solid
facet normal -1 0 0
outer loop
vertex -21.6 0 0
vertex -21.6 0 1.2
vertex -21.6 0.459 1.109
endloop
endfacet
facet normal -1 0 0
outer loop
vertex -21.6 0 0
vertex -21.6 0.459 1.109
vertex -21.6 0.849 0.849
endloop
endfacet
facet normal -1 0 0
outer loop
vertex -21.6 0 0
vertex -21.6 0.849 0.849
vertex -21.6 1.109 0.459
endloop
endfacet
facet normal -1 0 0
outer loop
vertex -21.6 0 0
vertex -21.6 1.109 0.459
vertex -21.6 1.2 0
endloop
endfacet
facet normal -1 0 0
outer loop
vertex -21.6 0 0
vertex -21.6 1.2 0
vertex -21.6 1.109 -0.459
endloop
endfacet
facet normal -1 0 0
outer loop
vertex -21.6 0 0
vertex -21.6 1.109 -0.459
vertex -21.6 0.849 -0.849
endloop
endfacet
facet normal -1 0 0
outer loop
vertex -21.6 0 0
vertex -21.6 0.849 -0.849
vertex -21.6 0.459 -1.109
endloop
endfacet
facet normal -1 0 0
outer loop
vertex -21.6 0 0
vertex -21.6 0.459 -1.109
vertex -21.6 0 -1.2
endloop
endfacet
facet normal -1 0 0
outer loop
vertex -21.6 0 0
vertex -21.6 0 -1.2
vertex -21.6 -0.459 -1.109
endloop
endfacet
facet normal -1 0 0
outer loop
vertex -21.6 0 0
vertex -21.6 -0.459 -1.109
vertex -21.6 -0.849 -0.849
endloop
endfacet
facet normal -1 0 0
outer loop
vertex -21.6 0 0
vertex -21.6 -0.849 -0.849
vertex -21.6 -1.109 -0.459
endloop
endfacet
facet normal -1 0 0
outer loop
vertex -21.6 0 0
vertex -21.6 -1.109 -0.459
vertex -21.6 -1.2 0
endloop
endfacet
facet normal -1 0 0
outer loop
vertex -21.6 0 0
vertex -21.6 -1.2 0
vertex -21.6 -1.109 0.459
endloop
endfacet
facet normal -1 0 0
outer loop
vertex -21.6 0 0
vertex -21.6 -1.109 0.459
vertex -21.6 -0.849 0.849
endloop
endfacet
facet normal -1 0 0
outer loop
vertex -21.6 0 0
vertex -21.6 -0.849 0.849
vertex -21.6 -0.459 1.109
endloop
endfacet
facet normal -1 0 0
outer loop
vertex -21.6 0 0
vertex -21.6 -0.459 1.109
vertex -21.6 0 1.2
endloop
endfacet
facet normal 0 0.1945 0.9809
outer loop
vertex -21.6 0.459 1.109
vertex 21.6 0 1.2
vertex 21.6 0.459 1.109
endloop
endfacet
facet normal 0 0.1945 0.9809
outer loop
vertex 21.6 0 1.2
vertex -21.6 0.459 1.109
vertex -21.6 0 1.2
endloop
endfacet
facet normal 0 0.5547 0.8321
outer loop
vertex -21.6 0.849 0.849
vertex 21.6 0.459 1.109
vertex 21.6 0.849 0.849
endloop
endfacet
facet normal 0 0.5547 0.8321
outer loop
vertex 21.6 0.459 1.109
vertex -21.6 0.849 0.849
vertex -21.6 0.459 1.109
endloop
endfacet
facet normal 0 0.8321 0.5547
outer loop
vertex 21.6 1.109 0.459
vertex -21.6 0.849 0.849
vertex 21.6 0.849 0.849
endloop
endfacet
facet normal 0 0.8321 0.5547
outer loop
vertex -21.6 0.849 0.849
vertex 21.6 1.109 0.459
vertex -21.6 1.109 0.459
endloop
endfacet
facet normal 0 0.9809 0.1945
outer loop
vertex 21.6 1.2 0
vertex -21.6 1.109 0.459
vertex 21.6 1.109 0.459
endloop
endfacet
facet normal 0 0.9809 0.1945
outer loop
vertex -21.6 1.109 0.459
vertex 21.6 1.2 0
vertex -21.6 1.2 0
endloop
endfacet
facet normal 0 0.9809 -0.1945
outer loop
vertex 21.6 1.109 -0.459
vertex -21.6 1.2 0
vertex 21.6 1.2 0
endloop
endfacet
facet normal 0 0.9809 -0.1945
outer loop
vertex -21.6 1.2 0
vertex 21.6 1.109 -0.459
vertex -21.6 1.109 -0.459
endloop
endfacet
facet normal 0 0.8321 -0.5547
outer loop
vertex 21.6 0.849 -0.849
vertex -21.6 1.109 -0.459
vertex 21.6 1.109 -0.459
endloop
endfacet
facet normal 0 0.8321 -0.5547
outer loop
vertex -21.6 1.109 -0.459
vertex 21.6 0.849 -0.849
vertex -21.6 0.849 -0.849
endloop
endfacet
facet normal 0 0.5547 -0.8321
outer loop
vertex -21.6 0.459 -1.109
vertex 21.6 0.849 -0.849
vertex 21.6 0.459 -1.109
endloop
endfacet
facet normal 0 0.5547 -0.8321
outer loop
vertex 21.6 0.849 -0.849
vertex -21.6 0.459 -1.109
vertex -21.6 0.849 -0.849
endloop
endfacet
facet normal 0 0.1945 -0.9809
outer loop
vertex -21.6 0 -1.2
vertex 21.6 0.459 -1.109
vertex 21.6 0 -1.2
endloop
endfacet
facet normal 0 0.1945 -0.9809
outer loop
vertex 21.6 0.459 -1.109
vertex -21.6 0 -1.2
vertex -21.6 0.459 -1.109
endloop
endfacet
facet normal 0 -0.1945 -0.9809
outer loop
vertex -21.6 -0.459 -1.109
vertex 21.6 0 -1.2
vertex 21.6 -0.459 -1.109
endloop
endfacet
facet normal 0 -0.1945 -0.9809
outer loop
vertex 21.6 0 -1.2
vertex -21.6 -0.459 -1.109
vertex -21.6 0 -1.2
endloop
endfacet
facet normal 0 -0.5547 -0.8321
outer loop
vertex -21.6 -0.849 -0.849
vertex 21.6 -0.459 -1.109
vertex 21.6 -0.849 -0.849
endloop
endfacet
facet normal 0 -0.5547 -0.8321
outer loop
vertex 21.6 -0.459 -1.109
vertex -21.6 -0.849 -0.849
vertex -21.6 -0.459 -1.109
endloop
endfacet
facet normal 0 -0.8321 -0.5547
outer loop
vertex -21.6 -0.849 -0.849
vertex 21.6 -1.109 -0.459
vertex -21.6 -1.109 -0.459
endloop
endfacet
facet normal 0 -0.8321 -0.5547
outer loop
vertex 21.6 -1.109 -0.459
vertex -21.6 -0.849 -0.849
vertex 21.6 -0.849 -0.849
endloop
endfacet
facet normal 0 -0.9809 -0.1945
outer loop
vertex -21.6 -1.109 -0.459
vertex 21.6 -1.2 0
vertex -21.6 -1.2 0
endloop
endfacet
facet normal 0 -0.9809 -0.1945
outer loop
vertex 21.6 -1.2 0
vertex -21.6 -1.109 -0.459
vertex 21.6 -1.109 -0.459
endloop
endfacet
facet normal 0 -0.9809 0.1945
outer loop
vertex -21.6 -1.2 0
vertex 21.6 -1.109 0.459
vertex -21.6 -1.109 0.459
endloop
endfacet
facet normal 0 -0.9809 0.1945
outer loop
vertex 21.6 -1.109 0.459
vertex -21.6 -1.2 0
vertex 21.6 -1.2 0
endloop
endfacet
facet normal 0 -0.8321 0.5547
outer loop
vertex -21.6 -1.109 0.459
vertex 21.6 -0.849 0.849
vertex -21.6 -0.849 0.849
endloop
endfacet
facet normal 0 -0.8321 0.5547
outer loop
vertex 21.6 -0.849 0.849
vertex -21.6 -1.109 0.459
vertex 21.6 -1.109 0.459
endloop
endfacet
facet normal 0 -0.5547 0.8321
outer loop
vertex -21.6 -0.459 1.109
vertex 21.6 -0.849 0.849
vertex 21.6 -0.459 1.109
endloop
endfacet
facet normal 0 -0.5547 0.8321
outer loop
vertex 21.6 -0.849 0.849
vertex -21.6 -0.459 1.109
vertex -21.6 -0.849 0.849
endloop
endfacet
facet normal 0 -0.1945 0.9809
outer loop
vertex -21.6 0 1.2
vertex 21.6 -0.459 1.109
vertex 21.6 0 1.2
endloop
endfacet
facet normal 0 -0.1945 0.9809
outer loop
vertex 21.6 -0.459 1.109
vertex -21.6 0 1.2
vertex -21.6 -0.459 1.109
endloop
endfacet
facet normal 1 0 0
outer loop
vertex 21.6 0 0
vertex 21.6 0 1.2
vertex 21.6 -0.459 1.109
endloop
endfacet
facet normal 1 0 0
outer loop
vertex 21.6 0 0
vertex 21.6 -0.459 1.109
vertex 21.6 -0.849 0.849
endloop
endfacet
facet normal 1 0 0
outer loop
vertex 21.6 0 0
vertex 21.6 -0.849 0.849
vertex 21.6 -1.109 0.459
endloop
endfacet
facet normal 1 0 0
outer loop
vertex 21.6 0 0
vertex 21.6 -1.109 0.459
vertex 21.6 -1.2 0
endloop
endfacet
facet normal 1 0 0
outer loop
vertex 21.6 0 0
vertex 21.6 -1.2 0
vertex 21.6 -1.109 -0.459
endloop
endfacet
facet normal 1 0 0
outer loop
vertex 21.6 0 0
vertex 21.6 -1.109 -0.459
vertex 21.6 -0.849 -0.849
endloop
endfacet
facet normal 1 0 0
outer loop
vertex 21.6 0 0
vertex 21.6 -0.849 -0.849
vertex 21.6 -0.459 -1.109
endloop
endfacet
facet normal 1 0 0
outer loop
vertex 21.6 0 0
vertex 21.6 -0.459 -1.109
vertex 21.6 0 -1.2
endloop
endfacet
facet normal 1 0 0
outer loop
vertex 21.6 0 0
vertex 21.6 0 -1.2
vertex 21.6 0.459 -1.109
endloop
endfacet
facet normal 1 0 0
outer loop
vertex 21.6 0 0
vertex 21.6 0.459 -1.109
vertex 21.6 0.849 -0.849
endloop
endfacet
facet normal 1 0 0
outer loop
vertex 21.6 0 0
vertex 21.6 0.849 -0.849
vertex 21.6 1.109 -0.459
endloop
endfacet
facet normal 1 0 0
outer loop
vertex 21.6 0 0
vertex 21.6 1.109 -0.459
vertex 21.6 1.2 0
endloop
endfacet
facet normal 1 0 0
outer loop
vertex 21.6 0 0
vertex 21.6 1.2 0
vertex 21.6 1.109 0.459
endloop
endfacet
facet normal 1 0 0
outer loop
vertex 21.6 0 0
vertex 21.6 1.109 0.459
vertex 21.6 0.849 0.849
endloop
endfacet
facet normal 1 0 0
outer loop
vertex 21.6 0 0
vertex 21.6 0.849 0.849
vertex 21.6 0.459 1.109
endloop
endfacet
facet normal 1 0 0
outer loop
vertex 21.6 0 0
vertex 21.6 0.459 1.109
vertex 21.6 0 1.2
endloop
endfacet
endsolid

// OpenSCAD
// file: ../p/4-4edge.scad
use <../lib.scad>
function ldraw_lib__4_4edge() = [
// 0 Circle 1.0
// 0 Name: 4-4edge.dat
// 0 Author: James Jessiman
// 0 !LDRAW_ORG Primitive UPDATE 2017-01
// 0 !LICENSE Licensed under CC BY 4.0 : see CAreadme.txt
// 
// 0 BFC CERTIFY CCW
  [0,"BFC","CERTIFY"],
  [0,"BFC","CCW"],
// 
// 0 !HISTORY 1998-12-15 [PTadmin] Official Update 1998-10
// 0 !HISTORY 2005-12-28 [PTadmin] Official Update 2005-01
// 0 !HISTORY 2007-06-24 [PTadmin] Header formatted for Contributor Agreement
// 0 !HISTORY 2008-07-01 [PTadmin] Official Update 2008-01
// 0 !HISTORY 2017-01-15 [Steffen] BFCed
// 0 !HISTORY 2017-12-30 [PTadmin] Official Update 2017-01
// 
// 
// 2 24 1 0 0 0.9239 0 0.3827
  [2,24,1,0,0,0.9239,0,0.3827],
// 2 24 0.9239 0 0.3827 0.7071 0 0.7071
  [2,24,0.9239,0,0.3827,0.7071,0,0.7071],
// 2 24 0.7071 0 0.7071 0.3827 0 0.9239
  [2,24,0.7071,0,0.7071,0.3827,0,0.9239],
// 2 24 0.3827 0 0.9239 0 0 1
  [2,24,0.3827,0,0.9239,0,0,1],
// 2 24 0 0 1 -0.3827 0 0.9239
  [2,24,0,0,1,-0.3827,0,0.9239],
// 2 24 -0.3827 0 0.9239 -0.7071 0 0.7071
  [2,24,-0.3827,0,0.9239,-0.7071,0,0.7071],
// 2 24 -0.7071 0 0.7071 -0.9239 0 0.3827
  [2,24,-0.7071,0,0.7071,-0.9239,0,0.3827],
// 2 24 -0.9239 0 0.3827 -1 0 -0
  [2,24,-0.9239,0,0.3827,-1,0,-0],
// 2 24 -1 0 -0 -0.9239 0 -0.3827
  [2,24,-1,0,-0,-0.9239,0,-0.3827],
// 2 24 -0.9239 0 -0.3827 -0.7071 0 -0.7071
  [2,24,-0.9239,0,-0.3827,-0.7071,0,-0.7071],
// 2 24 -0.7071 0 -0.7071 -0.3827 0 -0.9239
  [2,24,-0.7071,0,-0.7071,-0.3827,0,-0.9239],
// 2 24 -0.3827 0 -0.9239 0 0 -1
  [2,24,-0.3827,0,-0.9239,0,0,-1],
// 2 24 0 0 -1 0.3827 0 -0.9239
  [2,24,0,0,-1,0.3827,0,-0.9239],
// 2 24 0.3827 0 -0.9239 0.7071 0 -0.7071
  [2,24,0.3827,0,-0.9239,0.7071,0,-0.7071],
// 2 24 0.7071 0 -0.7071 0.9239 0 -0.3827
  [2,24,0.7071,0,-0.7071,0.9239,0,-0.3827],
// 2 24 0.9239 0 -0.3827 1 0 0
  [2,24,0.9239,0,-0.3827,1,0,0],
];
module ldraw_lib__4_4edge(step=0, col=false, unit=2/5, alt=false, line=0.2, solid=!$preview)
    makepoly(ldraw_lib__4_4edge(), step=step, col=col, unit=unit, alt=alt, line=line, solid=solid);
ldraw_lib__4_4edge(line=0.2);
// file: ../p/4-4cyli.scad
use <../lib.scad>
function ldraw_lib__4_4cyli() = [
// 0 Cylinder 1.0
// 0 Name: 4-4cyli.dat
// 0 Author: James Jessiman
// 0 !LDRAW_ORG Primitive UPDATE 2005-01
// 0 !LICENSE Licensed under CC BY 4.0 : see CAreadme.txt
// 
// 0 BFC CERTIFY CCW
  [0,"BFC","CERTIFY"],
  [0,"BFC","CCW"],
// 
// 0 !HISTORY 1998-12-15 [PTadmin] Official Update 1998-10
// 0 !HISTORY 2002-03-23 [sbliss] Added BFC statement; merged headers from files in distributions LDraw 0.27 and Complete.
// 0 !HISTORY 2002-04-25 [PTadmin] Official Update 2002-02
// 0 !HISTORY 2004-12-14 [guyvivan] BFC CCW
// 0 !HISTORY 2005-12-28 [PTadmin] Official Update 2005-01
// 0 !HISTORY 2007-06-24 [PTadmin] Header formatted for Contributor Agreement
// 0 !HISTORY 2008-07-01 [PTadmin] Official Update 2008-01
// 
// 
// 4 16 1 1 0 0.9239 1 0.3827 0.9239 0 0.3827 1 0 0
  [4,16,1,1,0,0.9239,1,0.3827,0.9239,0,0.3827,1,0,0],
// 5 24 1 0 0 1 1 0 0.9239 0 0.3827 0.9239 0 -0.3827
  [5,24,1,0,0,1,1,0,0.9239,0,0.3827,0.9239,0,-0.3827],
// 4 16 0.9239 1 0.3827 0.7071 1 0.7071 0.7071 0 0.7071 0.9239 0 0.3827
  [4,16,0.9239,1,0.3827,0.7071,1,0.7071,0.7071,0,0.7071,0.9239,0,0.3827],
// 5 24 0.9239 0 0.3827 0.9239 1 0.3827 0.7071 0 0.7071 1 0 0
  [5,24,0.9239,0,0.3827,0.9239,1,0.3827,0.7071,0,0.7071,1,0,0],
// 4 16 0.7071 1 0.7071 0.3827 1 0.9239 0.3827 0 0.9239 0.7071 0 0.7071
  [4,16,0.7071,1,0.7071,0.3827,1,0.9239,0.3827,0,0.9239,0.7071,0,0.7071],
// 5 24 0.7071 0 0.7071 0.7071 1 0.7071 0.3827 0 0.9239 0.9239 0 0.3827
  [5,24,0.7071,0,0.7071,0.7071,1,0.7071,0.3827,0,0.9239,0.9239,0,0.3827],
// 4 16 0.3827 1 0.9239 0 1 1 0 0 1 0.3827 0 0.9239
  [4,16,0.3827,1,0.9239,0,1,1,0,0,1,0.3827,0,0.9239],
// 5 24 0.3827 0 0.9239 0.3827 1 0.9239 0 0 1 0.7071 0 0.7071
  [5,24,0.3827,0,0.9239,0.3827,1,0.9239,0,0,1,0.7071,0,0.7071],
// 4 16 0 1 1 -0.3827 1 0.9239 -0.3827 0 0.9239 0 0 1
  [4,16,0,1,1,-0.3827,1,0.9239,-0.3827,0,0.9239,0,0,1],
// 5 24 0 0 1 0 1 1 -0.3827 0 0.9239 0.3827 0 0.9239
  [5,24,0,0,1,0,1,1,-0.3827,0,0.9239,0.3827,0,0.9239],
// 4 16 -0.3827 1 0.9239 -0.7071 1 0.7071 -0.7071 0 0.7071 -0.3827 0 0.9239
  [4,16,-0.3827,1,0.9239,-0.7071,1,0.7071,-0.7071,0,0.7071,-0.3827,0,0.9239],
// 5 24 -0.3827 0 0.9239 -0.3827 1 0.9239 -0.7071 0 0.7071 0 0 1
  [5,24,-0.3827,0,0.9239,-0.3827,1,0.9239,-0.7071,0,0.7071,0,0,1],
// 4 16 -0.7071 1 0.7071 -0.9239 1 0.3827 -0.9239 0 0.3827 -0.7071 0 0.7071
  [4,16,-0.7071,1,0.7071,-0.9239,1,0.3827,-0.9239,0,0.3827,-0.7071,0,0.7071],
// 5 24 -0.7071 0 0.7071 -0.7071 1 0.7071 -0.9239 0 0.3827 -0.3827 0 0.9239
  [5,24,-0.7071,0,0.7071,-0.7071,1,0.7071,-0.9239,0,0.3827,-0.3827,0,0.9239],
// 4 16 -0.9239 1 0.3827 -1 1 0 -1 0 0 -0.9239 0 0.3827
  [4,16,-0.9239,1,0.3827,-1,1,0,-1,0,0,-0.9239,0,0.3827],
// 5 24 -0.9239 0 0.3827 -0.9239 1 0.3827 -1 0 0 -0.7071 0 0.7071
  [5,24,-0.9239,0,0.3827,-0.9239,1,0.3827,-1,0,0,-0.7071,0,0.7071],
// 4 16 -1 1 0 -0.9239 1 -0.3827 -0.9239 0 -0.3827 -1 0 0
  [4,16,-1,1,0,-0.9239,1,-0.3827,-0.9239,0,-0.3827,-1,0,0],
// 5 24 -1 0 0 -1 1 0 -0.9239 0 -0.3827 -0.9239 0 0.3827
  [5,24,-1,0,0,-1,1,0,-0.9239,0,-0.3827,-0.9239,0,0.3827],
// 4 16 -0.9239 1 -0.3827 -0.7071 1 -0.7071 -0.7071 0 -0.7071 -0.9239 0 -0.3827
  [4,16,-0.9239,1,-0.3827,-0.7071,1,-0.7071,-0.7071,0,-0.7071,-0.9239,0,-0.3827],
// 5 24 -0.9239 0 -0.3827 -0.9239 1 -0.3827 -0.7071 0 -0.7071 -1 0 0
  [5,24,-0.9239,0,-0.3827,-0.9239,1,-0.3827,-0.7071,0,-0.7071,-1,0,0],
// 4 16 -0.7071 1 -0.7071 -0.3827 1 -0.9239 -0.3827 0 -0.9239 -0.7071 0 -0.7071
  [4,16,-0.7071,1,-0.7071,-0.3827,1,-0.9239,-0.3827,0,-0.9239,-0.7071,0,-0.7071],
// 5 24 -0.7071 0 -0.7071 -0.7071 1 -0.7071 -0.3827 0 -0.9239 -0.9239 0 -0.3827
  [5,24,-0.7071,0,-0.7071,-0.7071,1,-0.7071,-0.3827,0,-0.9239,-0.9239,0,-0.3827],
// 4 16 -0.3827 1 -0.9239 0 1 -1 0 0 -1 -0.3827 0 -0.9239
  [4,16,-0.3827,1,-0.9239,0,1,-1,0,0,-1,-0.3827,0,-0.9239],
// 5 24 -0.3827 0 -0.9239 -0.3827 1 -0.9239 0 0 -1 -0.7071 0 -0.7071
  [5,24,-0.3827,0,-0.9239,-0.3827,1,-0.9239,0,0,-1,-0.7071,0,-0.7071],
// 4 16 0 1 -1 0.3827 1 -0.9239 0.3827 0 -0.9239 0 0 -1
  [4,16,0,1,-1,0.3827,1,-0.9239,0.3827,0,-0.9239,0,0,-1],
// 5 24 0 0 -1 0 1 -1 0.3827 0 -0.9239 -0.3827 0 -0.9239
  [5,24,0,0,-1,0,1,-1,0.3827,0,-0.9239,-0.3827,0,-0.9239],
// 4 16 0.3827 1 -0.9239 0.7071 1 -0.7071 0.7071 0 -0.7071 0.3827 0 -0.9239
  [4,16,0.3827,1,-0.9239,0.7071,1,-0.7071,0.7071,0,-0.7071,0.3827,0,-0.9239],
// 5 24 0.3827 0 -0.9239 0.3827 1 -0.9239 0.7071 0 -0.7071 0 0 -1
  [5,24,0.3827,0,-0.9239,0.3827,1,-0.9239,0.7071,0,-0.7071,0,0,-1],
// 4 16 0.7071 1 -0.7071 0.9239 1 -0.3827 0.9239 0 -0.3827 0.7071 0 -0.7071
  [4,16,0.7071,1,-0.7071,0.9239,1,-0.3827,0.9239,0,-0.3827,0.7071,0,-0.7071],
// 5 24 0.7071 0 -0.7071 0.7071 1 -0.7071 0.9239 0 -0.3827 0.3827 0 -0.9239
  [5,24,0.7071,0,-0.7071,0.7071,1,-0.7071,0.9239,0,-0.3827,0.3827,0,-0.9239],
// 4 16 0.9239 1 -0.3827 1 1 0 1 0 0 0.9239 0 -0.3827
  [4,16,0.9239,1,-0.3827,1,1,0,1,0,0,0.9239,0,-0.3827],
// 5 24 0.9239 0 -0.3827 0.9239 1 -0.3827 1 0 0 0.7071 0 -0.7071
  [5,24,0.9239,0,-0.3827,0.9239,1,-0.3827,1,0,0,0.7071,0,-0.7071],
// 0
];
module ldraw_lib__4_4cyli(step=0, col=false, unit=2/5, alt=false, line=0.2, solid=!$preview)
    makepoly(ldraw_lib__4_4cyli(), step=step, col=col, unit=unit, alt=alt, line=line, solid=solid);
ldraw_lib__4_4cyli(line=0.2);
// file: ../p/4-4disc.scad
use <../lib.scad>
function ldraw_lib__4_4disc() = [
// 0 Disc 1.0
// 0 Name: 4-4disc.dat
// 0 Author: James Jessiman
// 0 !LDRAW_ORG Primitive UPDATE 2002-02
// 0 !LICENSE Licensed under CC BY 4.0 : see CAreadme.txt
// 
// 0 BFC CERTIFY CCW
  [0,"BFC","CERTIFY"],
  [0,"BFC","CCW"],
// 
// 0 !HISTORY 1998-12-15 [PTadmin] Official Update 1998-10
// 0 !HISTORY 2002-03-23 [sbliss] Added BFC statement
// 0 !HISTORY 2002-04-25 [PTadmin] Official Update 2002-02
// 0 !HISTORY 2007-06-24 [PTadmin] Header formatted for Contributor Agreement
// 0 !HISTORY 2008-07-01 [PTadmin] Official Update 2008-01
// 
// 
// 3 16 0 0 0 1 0 0 0.9239 0 0.3827
  [3,16,0,0,0,1,0,0,0.9239,0,0.3827],
// 3 16 0 0 0 0.9239 0 0.3827 0.7071 0 0.7071
  [3,16,0,0,0,0.9239,0,0.3827,0.7071,0,0.7071],
// 3 16 0 0 0 0.7071 0 0.7071 0.3827 0 0.9239
  [3,16,0,0,0,0.7071,0,0.7071,0.3827,0,0.9239],
// 3 16 0 0 0 0.3827 0 0.9239 0 0 1
  [3,16,0,0,0,0.3827,0,0.9239,0,0,1],
// 3 16 0 0 0 0 0 1 -0.3827 0 0.9239
  [3,16,0,0,0,0,0,1,-0.3827,0,0.9239],
// 3 16 0 0 0 -0.3827 0 0.9239 -0.7071 0 0.7071
  [3,16,0,0,0,-0.3827,0,0.9239,-0.7071,0,0.7071],
// 3 16 0 0 0 -0.7071 0 0.7071 -0.9239 0 0.3827
  [3,16,0,0,0,-0.7071,0,0.7071,-0.9239,0,0.3827],
// 3 16 0 0 0 -0.9239 0 0.3827 -1 0 -0
  [3,16,0,0,0,-0.9239,0,0.3827,-1,0,-0],
// 3 16 0 0 0 -1 0 -0 -0.9239 0 -0.3827
  [3,16,0,0,0,-1,0,-0,-0.9239,0,-0.3827],
// 3 16 0 0 0 -0.9239 0 -0.3827 -0.7071 0 -0.7071
  [3,16,0,0,0,-0.9239,0,-0.3827,-0.7071,0,-0.7071],
// 3 16 0 0 0 -0.7071 0 -0.7071 -0.3827 0 -0.9239
  [3,16,0,0,0,-0.7071,0,-0.7071,-0.3827,0,-0.9239],
// 3 16 0 0 0 -0.3827 0 -0.9239 0 0 -1
  [3,16,0,0,0,-0.3827,0,-0.9239,0,0,-1],
// 3 16 0 0 0 0 0 -1 0.3827 0 -0.9239
  [3,16,0,0,0,0,0,-1,0.3827,0,-0.9239],
// 3 16 0 0 0 0.3827 0 -0.9239 0.7071 0 -0.7071
  [3,16,0,0,0,0.3827,0,-0.9239,0.7071,0,-0.7071],
// 3 16 0 0 0 0.7071 0 -0.7071 0.9239 0 -0.3827
  [3,16,0,0,0,0.7071,0,-0.7071,0.9239,0,-0.3827],
// 3 16 0 0 0 0.9239 0 -0.3827 1 0 0
  [3,16,0,0,0,0.9239,0,-0.3827,1,0,0],
// 0
];
module ldraw_lib__4_4disc(step=0, col=false, unit=2/5, alt=false, line=0.2, solid=!$preview)
    makepoly(ldraw_lib__4_4disc(), step=step, col=col, unit=unit, alt=alt, line=line, solid=solid);
ldraw_lib__4_4disc(line=0.2);
// file: ../p/4-4cylc.scad
use <../lib.scad>
use <4-4cyli.scad>
use <4-4disc.scad>
use <4-4edge.scad>
function ldraw_lib__4_4cylc() = [
// 0 Cylinder Closed 1.0
// 0 Name: 4-4cylc.dat
// 0 Author: Alex Taylor [anathema]
// 0 !LDRAW_ORG Primitive UPDATE 2009-02
// 0 !LICENSE Licensed under CC BY 4.0 : see CAreadme.txt
// 
// 0 BFC CERTIFY CCW
  [0,"BFC","CERTIFY"],
  [0,"BFC","CCW"],
// 
// 0 !HISTORY 2008-12-29 [cwdee] Removed one disc
// 0 !HISTORY 2009-09-03 [PTadmin] Official Update 2009-02
// 
// 
// 1 16 0 0 0 1 0 0 0 1 0 0 0 1 4-4edge.dat
  [1,16,0,0,0,1,0,0,0,1,0,0,0,1, ldraw_lib__4_4edge()],
// 1 16 0 1 0 1 0 0 0 1 0 0 0 1 4-4edge.dat
  [1,16,0,1,0,1,0,0,0,1,0,0,0,1, ldraw_lib__4_4edge()],
// 1 16 0 0 0 1 0 0 0 1 0 0 0 1 4-4disc.dat
  [1,16,0,0,0,1,0,0,0,1,0,0,0,1, ldraw_lib__4_4disc()],
// 1 16 0 0 0 1 0 0 0 1 0 0 0 1 4-4cyli.dat
  [1,16,0,0,0,1,0,0,0,1,0,0,0,1, ldraw_lib__4_4cyli()],
// 0
];
module ldraw_lib__4_4cylc(step=0, col=false, unit=2/5, alt=false, line=0.2, solid=!$preview)
    makepoly(ldraw_lib__4_4cylc(), step=step, col=col, unit=unit, alt=alt, line=line, solid=solid);
ldraw_lib__4_4cylc(line=0.2);
// main file
use <../lib.scad>
use <../p/4-4cylc.scad>
use <../p/4-4disc.scad>
function ldraw_lib__70081() = [
// 0 ~Axle Steel  6 x 108
// 0 Name: 70081.dat
// 0 Author: Alex Taylor [anathema]
// 0 !LDRAW_ORG Part UPDATE 2012-03
// 0 !LICENSE Licensed under CC BY 4.0 : see CAreadme.txt
// 
// 0 BFC CERTIFY CCW
  [0,"BFC","CERTIFY"],
  [0,"BFC","CCW"],
// 
// 0 !CATEGORY Wheel
// 0 !KEYWORDS Fabuland
// 
// 0 !HISTORY 2012-08-09 [PTadmin] Official Update 2012-02
// 0 !HISTORY 2012-11-04 [PTadmin] Renamed from u9162
// 0 !HISTORY 2012-12-28 [PTadmin] Official Update 2012-03
// 
// 
// 1 16 -54 0 0 0 108 0 -3 0 0 0 0 3 4-4cylc.dat
  [1,16,-54,0,0,0,108,0,-3,0,0,0,0,3, ldraw_lib__4_4cylc()],
// 1 16 54 0 0 0 -1 0 -3 0 0 0 0 -3 4-4disc.dat
  [1,16,54,0,0,0,-1,0,-3,0,0,0,0,-3, ldraw_lib__4_4disc()],
];
module ldraw_lib__70081(step=0, col=false, unit=2/5, alt=false, line=0.2, solid=!$preview)
    makepoly(ldraw_lib__70081(), step=step, col=col, unit=unit, alt=alt, line=line, solid=solid);
ldraw_lib__70081(line=0.2);
